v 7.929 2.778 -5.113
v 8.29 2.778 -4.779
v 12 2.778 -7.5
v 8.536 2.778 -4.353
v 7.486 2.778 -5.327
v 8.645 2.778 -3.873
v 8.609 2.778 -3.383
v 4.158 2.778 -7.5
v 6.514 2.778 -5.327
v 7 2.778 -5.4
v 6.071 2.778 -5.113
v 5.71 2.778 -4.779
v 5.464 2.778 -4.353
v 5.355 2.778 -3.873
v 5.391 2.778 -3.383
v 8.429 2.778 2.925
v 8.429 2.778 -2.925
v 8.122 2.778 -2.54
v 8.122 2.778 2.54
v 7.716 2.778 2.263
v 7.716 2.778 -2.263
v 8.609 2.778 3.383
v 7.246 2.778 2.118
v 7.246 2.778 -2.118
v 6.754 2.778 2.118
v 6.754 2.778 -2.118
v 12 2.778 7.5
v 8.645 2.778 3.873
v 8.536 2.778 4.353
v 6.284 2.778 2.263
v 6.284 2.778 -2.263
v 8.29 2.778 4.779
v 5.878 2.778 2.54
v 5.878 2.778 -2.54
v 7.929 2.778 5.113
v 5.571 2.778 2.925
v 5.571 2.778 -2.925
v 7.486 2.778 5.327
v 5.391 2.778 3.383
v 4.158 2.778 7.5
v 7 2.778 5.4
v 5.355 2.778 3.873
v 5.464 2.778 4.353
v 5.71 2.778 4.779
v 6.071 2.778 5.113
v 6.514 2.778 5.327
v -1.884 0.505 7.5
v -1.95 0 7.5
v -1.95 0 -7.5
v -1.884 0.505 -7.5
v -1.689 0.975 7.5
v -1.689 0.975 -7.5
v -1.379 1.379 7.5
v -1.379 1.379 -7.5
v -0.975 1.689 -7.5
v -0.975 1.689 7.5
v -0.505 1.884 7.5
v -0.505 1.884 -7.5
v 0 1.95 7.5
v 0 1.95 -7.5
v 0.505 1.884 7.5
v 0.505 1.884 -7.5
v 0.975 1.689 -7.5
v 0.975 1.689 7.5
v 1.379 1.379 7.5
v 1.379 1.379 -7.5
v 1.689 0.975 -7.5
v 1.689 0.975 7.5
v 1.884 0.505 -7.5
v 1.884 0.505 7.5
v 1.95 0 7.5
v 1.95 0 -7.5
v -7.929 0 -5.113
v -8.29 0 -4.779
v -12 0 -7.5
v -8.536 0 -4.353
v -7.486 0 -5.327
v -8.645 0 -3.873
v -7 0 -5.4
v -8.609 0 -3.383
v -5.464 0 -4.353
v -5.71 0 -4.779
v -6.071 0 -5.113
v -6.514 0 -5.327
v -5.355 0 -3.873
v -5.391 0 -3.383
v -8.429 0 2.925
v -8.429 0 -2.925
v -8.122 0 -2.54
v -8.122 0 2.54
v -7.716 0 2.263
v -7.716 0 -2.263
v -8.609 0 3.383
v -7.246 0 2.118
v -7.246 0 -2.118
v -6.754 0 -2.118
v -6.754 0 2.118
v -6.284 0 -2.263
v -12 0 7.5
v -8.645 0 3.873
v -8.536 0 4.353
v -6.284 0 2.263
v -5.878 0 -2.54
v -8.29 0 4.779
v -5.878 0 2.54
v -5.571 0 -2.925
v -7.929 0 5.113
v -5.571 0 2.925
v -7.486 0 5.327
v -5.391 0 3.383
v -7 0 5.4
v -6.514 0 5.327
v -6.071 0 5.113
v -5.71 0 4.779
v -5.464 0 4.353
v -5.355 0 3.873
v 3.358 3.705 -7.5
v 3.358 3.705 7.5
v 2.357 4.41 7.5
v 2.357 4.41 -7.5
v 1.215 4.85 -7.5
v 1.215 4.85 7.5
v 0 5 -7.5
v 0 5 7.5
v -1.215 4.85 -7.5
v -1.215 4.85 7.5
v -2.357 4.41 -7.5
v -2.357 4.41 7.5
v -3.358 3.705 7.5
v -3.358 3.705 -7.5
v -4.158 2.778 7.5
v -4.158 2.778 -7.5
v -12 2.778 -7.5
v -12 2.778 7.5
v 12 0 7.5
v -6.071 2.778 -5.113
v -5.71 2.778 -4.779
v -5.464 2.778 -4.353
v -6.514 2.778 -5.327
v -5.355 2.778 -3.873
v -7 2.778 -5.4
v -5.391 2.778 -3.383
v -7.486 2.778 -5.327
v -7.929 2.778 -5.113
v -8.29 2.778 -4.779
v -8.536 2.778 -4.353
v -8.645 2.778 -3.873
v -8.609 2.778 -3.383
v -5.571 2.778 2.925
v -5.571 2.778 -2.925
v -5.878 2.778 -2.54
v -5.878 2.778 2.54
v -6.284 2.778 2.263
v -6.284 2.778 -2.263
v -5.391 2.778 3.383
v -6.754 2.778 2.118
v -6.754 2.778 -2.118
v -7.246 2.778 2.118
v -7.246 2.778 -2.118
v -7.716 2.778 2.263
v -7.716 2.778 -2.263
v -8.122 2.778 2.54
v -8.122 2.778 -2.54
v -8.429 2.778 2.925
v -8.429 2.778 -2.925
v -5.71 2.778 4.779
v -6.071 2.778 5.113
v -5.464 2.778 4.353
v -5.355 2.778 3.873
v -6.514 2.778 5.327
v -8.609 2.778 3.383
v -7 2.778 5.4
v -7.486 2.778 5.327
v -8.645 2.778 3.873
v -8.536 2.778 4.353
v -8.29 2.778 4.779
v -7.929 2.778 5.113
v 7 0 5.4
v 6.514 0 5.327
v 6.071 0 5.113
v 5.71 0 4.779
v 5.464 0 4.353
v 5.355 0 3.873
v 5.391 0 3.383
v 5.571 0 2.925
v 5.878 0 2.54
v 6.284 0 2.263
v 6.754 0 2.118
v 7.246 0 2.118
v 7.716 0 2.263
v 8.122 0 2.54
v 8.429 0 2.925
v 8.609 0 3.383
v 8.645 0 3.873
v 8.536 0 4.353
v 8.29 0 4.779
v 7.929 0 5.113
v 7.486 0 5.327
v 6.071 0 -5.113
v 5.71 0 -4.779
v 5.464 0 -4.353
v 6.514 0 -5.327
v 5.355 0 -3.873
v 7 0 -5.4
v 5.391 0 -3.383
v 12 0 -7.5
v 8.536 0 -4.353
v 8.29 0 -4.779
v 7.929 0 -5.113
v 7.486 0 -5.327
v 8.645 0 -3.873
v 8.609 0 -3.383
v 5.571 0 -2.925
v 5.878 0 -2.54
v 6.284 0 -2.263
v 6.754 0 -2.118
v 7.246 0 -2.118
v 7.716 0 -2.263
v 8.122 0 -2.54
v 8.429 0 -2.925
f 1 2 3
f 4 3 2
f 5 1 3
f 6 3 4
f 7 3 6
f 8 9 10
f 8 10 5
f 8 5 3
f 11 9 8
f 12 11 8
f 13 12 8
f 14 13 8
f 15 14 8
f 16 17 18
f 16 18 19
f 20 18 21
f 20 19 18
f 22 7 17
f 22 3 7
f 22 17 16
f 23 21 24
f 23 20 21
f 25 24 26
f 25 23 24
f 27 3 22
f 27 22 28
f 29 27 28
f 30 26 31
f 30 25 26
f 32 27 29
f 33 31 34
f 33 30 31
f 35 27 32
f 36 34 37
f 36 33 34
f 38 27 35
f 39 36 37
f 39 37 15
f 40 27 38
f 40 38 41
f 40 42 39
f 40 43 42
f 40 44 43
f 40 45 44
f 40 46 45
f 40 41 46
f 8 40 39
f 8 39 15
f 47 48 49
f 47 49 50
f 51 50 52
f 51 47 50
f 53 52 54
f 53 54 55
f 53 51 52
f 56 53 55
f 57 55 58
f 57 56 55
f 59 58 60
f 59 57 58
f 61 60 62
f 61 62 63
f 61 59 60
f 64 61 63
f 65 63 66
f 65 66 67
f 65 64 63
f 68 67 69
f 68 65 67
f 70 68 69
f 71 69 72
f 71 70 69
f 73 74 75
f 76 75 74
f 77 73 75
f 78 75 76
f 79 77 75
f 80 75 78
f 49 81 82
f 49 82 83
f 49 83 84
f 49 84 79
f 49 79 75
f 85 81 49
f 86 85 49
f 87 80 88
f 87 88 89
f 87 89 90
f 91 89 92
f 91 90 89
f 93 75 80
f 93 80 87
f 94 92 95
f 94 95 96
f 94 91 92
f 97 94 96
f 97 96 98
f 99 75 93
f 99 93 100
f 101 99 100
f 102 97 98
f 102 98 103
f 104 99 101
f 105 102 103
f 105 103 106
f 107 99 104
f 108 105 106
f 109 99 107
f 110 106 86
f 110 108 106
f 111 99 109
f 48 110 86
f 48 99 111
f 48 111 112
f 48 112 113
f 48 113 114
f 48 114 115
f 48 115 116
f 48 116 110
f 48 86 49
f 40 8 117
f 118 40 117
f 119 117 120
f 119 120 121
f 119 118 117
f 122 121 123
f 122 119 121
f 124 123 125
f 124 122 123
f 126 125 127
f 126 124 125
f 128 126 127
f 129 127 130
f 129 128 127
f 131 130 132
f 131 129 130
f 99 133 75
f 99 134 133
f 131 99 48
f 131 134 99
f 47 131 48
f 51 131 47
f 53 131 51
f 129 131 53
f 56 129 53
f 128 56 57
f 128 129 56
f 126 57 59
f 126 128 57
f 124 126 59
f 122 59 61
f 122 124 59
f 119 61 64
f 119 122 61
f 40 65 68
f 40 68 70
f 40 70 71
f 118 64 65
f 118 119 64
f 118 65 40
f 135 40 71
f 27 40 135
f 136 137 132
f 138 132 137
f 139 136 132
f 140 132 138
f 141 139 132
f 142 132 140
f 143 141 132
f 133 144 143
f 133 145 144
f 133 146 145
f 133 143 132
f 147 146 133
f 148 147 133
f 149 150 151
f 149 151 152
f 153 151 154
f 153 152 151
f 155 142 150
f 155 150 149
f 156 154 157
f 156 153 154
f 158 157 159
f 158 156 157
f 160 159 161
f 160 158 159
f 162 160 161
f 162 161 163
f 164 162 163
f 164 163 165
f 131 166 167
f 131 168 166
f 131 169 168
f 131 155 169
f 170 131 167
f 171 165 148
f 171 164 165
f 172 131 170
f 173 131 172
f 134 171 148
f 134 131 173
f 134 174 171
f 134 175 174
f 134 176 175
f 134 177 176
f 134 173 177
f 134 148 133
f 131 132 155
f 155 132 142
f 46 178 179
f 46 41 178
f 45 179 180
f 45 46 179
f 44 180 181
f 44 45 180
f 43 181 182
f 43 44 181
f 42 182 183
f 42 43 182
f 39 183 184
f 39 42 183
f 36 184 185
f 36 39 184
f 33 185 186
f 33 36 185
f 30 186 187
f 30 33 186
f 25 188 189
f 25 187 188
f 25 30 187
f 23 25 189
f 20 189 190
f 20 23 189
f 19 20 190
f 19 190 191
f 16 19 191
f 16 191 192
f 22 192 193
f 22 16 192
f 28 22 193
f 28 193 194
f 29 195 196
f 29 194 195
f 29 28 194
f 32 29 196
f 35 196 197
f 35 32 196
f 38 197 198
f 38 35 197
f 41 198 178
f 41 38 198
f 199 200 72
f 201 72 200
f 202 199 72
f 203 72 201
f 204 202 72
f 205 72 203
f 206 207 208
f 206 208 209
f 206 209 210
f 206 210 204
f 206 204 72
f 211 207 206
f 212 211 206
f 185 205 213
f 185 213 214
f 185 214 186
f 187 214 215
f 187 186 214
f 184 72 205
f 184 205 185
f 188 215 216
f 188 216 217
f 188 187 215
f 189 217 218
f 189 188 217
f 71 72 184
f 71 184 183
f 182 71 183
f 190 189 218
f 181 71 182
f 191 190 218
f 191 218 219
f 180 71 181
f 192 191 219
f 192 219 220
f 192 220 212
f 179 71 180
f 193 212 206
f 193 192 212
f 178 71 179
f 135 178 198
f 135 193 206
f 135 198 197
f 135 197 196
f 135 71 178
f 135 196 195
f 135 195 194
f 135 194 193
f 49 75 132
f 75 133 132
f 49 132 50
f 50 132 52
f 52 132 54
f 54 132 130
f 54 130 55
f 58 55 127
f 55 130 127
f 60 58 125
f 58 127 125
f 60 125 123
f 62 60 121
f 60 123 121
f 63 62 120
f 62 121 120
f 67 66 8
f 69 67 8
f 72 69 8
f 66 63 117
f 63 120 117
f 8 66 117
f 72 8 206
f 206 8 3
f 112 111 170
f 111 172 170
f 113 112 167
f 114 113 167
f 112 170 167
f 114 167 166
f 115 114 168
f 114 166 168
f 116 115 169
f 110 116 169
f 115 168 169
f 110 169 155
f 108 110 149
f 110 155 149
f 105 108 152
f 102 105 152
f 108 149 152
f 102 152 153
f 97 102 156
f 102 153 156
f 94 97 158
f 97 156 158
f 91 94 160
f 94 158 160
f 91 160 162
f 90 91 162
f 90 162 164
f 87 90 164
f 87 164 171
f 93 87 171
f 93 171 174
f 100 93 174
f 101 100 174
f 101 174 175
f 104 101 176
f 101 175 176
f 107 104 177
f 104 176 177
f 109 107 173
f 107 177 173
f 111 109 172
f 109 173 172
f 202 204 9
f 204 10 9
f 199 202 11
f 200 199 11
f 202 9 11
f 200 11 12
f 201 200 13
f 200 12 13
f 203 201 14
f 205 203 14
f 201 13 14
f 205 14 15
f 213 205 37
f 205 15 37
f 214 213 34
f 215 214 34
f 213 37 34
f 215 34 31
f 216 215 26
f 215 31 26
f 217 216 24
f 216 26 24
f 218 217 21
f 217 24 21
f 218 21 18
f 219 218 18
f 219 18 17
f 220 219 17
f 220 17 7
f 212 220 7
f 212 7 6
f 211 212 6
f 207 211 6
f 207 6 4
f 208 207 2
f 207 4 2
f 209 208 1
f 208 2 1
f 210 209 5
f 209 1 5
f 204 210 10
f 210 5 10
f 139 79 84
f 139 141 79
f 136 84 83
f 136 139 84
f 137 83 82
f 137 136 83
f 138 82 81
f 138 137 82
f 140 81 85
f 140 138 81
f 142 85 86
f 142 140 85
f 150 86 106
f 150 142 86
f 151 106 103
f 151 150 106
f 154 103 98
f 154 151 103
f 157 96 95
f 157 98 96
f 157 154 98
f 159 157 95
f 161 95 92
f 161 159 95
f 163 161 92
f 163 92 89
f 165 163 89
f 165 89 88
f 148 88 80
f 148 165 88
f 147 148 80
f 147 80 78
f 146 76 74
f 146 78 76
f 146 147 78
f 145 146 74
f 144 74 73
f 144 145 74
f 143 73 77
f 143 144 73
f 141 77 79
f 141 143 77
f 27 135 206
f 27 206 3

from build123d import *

# Parameters (mm, degrees)
BOSS_EXTRUDE1_DEPTH     = 7.5
SKETCH2_R               = 1.65
CUT_EXTRUDE1_DEPTH      = 15.420976523
MIRROR2_COPY_1_SKETCH_R = 1.65
MIRROR2_COPY_1_DEPTH    = 15.420976523


with BuildPart() as part:
    # Sketch1 → Boss-Extrude1 (new body)
    with BuildSketch(Plane.XY):
        with BuildLine():
            Line((-12, 0), (-5, 0))
            ThreePointArc((-5, 0), (-4.784761162, 1.451227281), (-4.157575752, 2.777510373))
            Line((-4.157575752, 2.777510373), (-12, 2.777510373))
            Line((-12, 2.777510373), (-12, 0))
        make_face()
        with BuildLine():
            ThreePointArc((-4.157575752, 2.777510373), (-4.784761162, 1.451227281), (-5, 0))
            Line((-5, 0), (-1.95, 0))
            ThreePointArc((-1.95, 0), (-1.378858223, 1.378858223), (0, 1.95))
            Line((0, 1.95), (0, 5))
            ThreePointArc((0, 5), (-2.357164413, 4.409509716), (-4.157575752, 2.777510373))
        make_face()
        with BuildLine():
            Line((1.95, 0), (5, 0))
            ThreePointArc((5, 0), (4.784761162, 1.451227281), (4.157575752, 2.777510373))
            ThreePointArc((4.157575752, 2.777510373), (2.357164413, 4.409509716), (0, 5))
            Line((0, 5), (0, 1.95))
            ThreePointArc((0, 1.95), (1.378858223, 1.378858223), (1.95, 0))
        make_face()
        with BuildLine():
            ThreePointArc((4.157575752, 2.777510373), (4.784761162, 1.451227281), (5, 0))
            Line((5, 0), (12, 0))
            Line((12, 0), (12, 2.777510373))
            Line((12, 2.777510373), (4.157575752, 2.777510373))
        make_face()
    boss_extrude1 = extrude(amount=BOSS_EXTRUDE1_DEPTH)

    # Sketch2 → Cut-Extrude1 (cut, symmetric)
    with BuildSketch(Plane(origin=(0, 2.777510373, 0), x_dir=(1, 0, 0), z_dir=(0, 1, 0))):
        with Locations(Location((-7, -3.75, 0), (0, 0, 270))):
            Circle(SKETCH2_R)
    cut_extrude1 = extrude(amount=CUT_EXTRUDE1_DEPTH, both=True, mode=Mode.SUBTRACT)

    # Mirror1: Cut-Extrude1 across plane
    add(cut_extrude1.mirror(Plane(origin=(0, 0, 0), x_dir=(0, 0, 1), z_dir=(1, 0, 0))), mode=Mode.SUBTRACT)

    # Mirror2: Boss-Extrude1, Cut-Extrude1 across plane
    add(boss_extrude1.mirror(Plane.XY))
    add(cut_extrude1.mirror(Plane.XY), mode=Mode.SUBTRACT)

    # Mirror2 copy 1 sketch → Mirror2 copy 1 (cut, symmetric)
    with BuildSketch(Plane(origin=(0, 2.777510373, 0), x_dir=(-1, 0, 0), z_dir=(0, 1, 0))):
        with Locations(Location((-7, -3.75, 0), (0, 0, 270))):
            Circle(MIRROR2_COPY_1_SKETCH_R)
    extrude(amount=MIRROR2_COPY_1_DEPTH, both=True, mode=Mode.SUBTRACT)


solid = part.part
